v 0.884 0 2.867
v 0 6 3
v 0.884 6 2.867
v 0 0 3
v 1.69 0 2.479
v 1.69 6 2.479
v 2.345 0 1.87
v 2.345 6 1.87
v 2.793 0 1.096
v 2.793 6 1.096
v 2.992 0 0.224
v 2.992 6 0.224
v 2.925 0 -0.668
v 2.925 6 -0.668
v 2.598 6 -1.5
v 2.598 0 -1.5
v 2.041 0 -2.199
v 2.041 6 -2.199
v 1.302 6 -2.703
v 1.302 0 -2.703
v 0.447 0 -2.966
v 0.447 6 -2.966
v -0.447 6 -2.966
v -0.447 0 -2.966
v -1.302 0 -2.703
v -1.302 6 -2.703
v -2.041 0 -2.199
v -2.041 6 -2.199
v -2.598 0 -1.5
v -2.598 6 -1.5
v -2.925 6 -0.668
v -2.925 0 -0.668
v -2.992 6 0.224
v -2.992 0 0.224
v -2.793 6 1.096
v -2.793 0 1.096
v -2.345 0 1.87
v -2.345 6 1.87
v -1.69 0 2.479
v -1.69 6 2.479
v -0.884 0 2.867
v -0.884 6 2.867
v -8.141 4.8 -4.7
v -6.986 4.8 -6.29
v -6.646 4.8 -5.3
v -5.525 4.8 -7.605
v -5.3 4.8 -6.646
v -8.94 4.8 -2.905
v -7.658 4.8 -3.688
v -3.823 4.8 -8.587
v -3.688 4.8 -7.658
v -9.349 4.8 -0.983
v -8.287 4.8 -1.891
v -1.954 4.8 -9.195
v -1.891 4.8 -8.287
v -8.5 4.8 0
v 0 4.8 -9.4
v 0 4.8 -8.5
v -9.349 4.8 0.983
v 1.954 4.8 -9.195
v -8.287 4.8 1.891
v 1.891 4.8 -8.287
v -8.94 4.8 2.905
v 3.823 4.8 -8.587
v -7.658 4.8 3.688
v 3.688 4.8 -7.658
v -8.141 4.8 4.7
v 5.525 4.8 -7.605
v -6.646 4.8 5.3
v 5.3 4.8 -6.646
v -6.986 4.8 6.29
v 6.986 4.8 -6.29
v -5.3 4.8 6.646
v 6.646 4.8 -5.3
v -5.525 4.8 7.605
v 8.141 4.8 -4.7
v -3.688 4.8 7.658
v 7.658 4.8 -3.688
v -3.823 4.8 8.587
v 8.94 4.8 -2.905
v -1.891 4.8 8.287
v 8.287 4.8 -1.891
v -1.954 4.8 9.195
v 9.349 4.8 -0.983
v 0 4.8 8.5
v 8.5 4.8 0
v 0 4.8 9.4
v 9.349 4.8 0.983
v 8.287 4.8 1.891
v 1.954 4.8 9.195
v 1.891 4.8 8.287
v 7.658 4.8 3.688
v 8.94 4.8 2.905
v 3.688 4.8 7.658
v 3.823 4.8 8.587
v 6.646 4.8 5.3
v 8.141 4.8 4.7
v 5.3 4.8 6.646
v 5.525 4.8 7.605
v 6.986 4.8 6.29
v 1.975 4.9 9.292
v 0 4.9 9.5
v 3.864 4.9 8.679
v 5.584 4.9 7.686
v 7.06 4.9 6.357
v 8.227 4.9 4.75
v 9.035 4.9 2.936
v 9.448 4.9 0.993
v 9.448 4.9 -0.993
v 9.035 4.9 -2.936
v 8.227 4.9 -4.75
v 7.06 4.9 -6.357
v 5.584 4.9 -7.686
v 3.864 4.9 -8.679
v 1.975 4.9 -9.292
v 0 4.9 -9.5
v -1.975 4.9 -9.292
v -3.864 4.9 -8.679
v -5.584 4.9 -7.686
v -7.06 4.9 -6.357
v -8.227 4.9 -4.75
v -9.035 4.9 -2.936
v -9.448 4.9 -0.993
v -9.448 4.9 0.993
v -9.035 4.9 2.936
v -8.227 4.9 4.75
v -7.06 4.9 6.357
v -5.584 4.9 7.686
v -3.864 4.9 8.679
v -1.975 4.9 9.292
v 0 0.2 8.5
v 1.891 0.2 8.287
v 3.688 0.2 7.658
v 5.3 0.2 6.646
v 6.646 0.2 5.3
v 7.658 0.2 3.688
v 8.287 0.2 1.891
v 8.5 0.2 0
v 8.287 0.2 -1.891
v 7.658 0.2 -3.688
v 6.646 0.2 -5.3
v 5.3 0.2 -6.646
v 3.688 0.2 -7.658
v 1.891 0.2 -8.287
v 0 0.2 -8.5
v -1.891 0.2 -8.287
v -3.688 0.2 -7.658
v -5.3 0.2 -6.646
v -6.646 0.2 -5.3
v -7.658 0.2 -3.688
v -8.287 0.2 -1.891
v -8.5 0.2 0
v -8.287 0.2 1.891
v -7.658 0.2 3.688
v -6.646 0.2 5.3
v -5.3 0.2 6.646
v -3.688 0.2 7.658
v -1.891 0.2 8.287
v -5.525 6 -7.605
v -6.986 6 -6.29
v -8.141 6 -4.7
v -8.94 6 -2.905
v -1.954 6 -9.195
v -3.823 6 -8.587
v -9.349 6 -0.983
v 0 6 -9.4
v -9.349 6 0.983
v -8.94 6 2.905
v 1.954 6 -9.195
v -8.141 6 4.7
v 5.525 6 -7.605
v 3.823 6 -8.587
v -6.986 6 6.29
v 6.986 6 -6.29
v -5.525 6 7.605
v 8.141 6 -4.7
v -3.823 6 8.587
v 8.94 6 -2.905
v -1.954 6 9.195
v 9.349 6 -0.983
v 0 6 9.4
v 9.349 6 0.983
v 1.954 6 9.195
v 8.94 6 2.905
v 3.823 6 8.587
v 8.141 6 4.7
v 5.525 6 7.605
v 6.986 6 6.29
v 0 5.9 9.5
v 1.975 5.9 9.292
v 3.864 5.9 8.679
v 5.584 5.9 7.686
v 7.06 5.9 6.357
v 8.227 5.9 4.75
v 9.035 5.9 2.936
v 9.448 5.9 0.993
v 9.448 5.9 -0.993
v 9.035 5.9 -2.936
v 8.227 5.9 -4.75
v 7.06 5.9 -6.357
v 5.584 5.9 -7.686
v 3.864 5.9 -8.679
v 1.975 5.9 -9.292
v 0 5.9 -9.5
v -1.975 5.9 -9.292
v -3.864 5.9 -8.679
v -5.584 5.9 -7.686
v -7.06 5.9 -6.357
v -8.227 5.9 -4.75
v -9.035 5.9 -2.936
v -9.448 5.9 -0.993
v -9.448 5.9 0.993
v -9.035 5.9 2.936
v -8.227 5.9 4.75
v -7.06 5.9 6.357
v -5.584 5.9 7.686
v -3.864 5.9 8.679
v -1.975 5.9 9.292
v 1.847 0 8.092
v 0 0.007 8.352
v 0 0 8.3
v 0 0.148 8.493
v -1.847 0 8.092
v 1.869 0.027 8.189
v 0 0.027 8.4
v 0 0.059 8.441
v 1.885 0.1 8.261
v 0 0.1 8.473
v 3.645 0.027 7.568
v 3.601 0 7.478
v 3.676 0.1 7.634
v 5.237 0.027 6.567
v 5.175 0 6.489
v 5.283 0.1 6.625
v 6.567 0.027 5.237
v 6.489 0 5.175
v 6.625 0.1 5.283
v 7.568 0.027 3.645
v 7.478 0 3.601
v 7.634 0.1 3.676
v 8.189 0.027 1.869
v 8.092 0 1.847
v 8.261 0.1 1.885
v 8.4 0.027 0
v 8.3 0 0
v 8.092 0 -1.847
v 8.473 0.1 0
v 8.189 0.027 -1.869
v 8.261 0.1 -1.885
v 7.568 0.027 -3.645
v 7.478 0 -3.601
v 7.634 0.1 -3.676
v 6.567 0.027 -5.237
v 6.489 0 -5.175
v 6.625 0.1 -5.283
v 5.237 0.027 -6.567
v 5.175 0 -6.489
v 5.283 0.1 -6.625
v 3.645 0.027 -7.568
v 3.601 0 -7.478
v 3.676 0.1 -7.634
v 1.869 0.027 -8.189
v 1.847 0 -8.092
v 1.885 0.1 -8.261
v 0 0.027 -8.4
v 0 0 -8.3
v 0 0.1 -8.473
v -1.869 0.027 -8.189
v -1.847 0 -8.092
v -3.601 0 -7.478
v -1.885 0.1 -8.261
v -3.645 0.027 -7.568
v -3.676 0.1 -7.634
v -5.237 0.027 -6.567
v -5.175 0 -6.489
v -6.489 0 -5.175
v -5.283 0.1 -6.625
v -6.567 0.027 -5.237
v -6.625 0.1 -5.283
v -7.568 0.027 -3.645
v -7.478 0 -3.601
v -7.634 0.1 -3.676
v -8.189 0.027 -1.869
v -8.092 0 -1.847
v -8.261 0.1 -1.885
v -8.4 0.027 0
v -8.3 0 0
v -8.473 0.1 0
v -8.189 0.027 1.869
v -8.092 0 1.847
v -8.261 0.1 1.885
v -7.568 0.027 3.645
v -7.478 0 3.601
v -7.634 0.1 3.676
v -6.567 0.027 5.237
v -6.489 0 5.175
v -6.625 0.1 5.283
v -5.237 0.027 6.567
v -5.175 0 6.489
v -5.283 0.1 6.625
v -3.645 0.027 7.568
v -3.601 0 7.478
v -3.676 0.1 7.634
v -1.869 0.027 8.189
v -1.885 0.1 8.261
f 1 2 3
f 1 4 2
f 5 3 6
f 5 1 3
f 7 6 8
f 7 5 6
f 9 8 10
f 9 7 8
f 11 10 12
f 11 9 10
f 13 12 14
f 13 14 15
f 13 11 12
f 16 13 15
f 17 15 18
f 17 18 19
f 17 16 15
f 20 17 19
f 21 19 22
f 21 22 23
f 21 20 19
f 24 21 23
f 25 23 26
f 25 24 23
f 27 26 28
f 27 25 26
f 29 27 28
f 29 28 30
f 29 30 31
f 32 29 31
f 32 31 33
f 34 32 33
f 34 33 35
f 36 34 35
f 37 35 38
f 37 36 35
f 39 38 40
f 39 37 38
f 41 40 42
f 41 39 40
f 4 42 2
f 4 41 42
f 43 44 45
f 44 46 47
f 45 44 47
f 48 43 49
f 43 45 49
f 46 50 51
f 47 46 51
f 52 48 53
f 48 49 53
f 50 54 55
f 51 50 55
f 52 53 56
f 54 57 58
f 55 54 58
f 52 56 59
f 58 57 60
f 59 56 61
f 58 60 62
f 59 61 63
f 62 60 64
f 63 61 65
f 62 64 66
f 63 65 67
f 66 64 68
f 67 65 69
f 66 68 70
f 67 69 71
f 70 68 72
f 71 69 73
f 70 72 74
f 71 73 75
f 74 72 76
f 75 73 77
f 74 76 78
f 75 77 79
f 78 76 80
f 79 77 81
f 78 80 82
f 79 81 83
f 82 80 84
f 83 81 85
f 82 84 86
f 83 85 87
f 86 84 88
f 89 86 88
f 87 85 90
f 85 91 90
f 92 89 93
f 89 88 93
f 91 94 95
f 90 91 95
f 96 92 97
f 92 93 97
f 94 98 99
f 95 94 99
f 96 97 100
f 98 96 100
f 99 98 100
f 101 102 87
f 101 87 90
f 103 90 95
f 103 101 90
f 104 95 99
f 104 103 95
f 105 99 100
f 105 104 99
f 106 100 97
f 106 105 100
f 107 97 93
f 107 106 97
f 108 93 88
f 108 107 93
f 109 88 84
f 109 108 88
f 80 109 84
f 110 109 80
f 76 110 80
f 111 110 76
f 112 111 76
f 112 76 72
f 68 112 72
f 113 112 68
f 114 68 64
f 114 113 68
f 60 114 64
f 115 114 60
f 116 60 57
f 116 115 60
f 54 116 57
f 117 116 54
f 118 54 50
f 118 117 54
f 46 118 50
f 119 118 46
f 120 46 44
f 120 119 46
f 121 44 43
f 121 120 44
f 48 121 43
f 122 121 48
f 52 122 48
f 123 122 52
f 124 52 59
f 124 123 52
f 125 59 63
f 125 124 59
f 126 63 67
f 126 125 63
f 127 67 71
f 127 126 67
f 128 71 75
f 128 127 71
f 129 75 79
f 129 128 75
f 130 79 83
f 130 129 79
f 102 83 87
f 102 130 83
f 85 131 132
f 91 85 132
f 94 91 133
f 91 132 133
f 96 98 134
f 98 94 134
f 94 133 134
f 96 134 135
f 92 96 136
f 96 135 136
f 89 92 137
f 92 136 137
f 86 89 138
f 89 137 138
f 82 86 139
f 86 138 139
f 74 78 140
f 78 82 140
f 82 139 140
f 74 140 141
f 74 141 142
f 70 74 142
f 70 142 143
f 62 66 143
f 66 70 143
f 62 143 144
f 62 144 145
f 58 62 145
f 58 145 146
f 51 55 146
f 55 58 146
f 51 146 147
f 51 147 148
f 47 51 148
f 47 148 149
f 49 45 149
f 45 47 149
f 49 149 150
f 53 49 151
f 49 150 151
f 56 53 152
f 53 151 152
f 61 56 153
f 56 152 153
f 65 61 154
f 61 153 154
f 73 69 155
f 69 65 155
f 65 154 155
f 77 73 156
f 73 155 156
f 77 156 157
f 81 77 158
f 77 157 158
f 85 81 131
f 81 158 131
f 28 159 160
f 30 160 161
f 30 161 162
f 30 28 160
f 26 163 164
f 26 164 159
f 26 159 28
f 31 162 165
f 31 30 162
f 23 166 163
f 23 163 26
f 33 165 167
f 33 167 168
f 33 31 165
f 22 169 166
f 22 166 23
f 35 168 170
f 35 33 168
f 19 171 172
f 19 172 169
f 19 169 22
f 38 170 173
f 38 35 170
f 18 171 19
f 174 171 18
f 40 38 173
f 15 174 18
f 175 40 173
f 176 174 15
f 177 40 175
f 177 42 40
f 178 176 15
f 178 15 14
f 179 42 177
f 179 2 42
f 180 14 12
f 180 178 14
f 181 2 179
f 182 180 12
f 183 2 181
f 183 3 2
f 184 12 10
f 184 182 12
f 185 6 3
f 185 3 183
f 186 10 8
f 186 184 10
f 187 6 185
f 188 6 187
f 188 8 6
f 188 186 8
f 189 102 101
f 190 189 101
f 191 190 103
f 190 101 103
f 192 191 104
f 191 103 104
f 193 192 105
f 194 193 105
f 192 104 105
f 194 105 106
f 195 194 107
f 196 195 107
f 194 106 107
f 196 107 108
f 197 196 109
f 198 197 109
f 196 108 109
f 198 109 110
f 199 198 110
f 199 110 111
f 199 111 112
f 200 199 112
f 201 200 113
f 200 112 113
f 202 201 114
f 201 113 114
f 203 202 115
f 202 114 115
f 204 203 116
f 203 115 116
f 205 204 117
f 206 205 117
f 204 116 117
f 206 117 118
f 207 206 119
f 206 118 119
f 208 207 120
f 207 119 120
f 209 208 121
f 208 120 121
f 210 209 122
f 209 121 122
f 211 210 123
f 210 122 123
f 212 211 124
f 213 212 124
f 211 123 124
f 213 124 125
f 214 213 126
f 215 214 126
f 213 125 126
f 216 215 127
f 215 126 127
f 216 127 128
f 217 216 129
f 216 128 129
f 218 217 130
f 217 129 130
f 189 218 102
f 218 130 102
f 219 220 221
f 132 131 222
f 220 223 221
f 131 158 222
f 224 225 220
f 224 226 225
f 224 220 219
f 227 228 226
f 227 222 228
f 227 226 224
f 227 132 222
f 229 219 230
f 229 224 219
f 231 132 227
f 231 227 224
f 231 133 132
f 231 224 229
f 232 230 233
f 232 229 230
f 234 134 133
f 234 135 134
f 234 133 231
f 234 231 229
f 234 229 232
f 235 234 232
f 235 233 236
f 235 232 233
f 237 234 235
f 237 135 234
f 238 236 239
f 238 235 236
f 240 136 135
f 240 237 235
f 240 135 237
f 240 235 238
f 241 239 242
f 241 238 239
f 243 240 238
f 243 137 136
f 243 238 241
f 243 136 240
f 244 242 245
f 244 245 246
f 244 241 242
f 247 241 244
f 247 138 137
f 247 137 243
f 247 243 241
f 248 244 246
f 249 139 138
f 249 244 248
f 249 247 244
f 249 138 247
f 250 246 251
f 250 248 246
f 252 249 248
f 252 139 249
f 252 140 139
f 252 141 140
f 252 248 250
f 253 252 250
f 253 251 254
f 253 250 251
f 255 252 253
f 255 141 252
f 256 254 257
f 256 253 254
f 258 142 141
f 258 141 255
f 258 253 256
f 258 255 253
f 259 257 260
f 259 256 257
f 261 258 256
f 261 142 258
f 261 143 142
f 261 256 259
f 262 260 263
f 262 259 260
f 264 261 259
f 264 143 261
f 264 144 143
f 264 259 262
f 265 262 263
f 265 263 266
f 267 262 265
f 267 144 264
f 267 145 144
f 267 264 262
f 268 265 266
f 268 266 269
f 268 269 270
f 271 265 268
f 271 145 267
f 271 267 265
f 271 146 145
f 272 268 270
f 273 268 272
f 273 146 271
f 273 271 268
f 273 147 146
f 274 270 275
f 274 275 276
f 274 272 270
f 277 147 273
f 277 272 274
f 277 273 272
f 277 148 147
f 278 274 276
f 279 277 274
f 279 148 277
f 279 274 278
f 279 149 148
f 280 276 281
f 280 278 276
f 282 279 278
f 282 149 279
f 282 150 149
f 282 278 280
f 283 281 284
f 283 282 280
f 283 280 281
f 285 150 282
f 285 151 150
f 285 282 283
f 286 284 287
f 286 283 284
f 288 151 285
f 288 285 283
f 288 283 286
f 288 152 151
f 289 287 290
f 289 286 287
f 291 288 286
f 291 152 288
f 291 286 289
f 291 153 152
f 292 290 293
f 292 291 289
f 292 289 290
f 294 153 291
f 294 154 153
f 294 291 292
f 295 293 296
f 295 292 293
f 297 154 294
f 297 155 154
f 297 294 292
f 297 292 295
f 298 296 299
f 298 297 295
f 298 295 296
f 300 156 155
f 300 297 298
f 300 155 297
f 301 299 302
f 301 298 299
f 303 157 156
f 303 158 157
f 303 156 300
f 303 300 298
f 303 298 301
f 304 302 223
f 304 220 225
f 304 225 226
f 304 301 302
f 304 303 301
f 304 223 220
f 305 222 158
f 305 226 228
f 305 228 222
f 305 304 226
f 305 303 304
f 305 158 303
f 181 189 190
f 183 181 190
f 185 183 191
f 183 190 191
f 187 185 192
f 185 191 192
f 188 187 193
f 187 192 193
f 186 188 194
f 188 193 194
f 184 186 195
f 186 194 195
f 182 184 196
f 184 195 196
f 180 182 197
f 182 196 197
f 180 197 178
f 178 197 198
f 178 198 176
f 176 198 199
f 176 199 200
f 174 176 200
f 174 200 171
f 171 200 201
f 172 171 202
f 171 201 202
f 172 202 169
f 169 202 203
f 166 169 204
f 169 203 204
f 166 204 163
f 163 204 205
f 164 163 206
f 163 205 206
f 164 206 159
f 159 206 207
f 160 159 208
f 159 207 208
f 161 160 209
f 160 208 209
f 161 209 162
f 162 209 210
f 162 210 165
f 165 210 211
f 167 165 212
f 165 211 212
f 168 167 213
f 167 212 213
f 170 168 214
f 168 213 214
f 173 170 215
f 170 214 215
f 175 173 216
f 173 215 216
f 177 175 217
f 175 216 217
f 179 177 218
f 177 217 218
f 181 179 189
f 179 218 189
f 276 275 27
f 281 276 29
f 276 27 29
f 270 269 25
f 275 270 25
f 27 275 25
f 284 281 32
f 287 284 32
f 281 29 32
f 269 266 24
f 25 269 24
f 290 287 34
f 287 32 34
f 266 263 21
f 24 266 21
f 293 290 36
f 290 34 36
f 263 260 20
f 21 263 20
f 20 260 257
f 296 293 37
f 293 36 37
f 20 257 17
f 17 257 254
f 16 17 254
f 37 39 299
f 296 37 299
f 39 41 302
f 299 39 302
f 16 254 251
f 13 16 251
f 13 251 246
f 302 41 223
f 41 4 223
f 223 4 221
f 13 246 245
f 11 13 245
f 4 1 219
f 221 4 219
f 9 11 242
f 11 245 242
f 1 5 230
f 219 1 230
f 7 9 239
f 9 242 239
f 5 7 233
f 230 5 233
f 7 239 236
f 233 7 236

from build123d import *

# Parameters (mm, degrees)
SKETCH_1_R      = 8.5
SKETCH_1_R_2    = 3
EXTRUDE_1_DEPTH = 6
EXTRUDE_START   = -1.2
SKETCH_2_R      = 9.5
SKETCH_2_R_2    = 3
EXTRUDE_2_DEPTH = 1.2
FILLET_1_R      = 0.2
CHAMFER_1_SIZE  = 0.1


with BuildPart() as part:
    # 草图1 → 凸台-拉伸1 (new body)
    with BuildSketch(Plane(origin=(0, 0, 0), x_dir=(1, 0, 0), z_dir=(0, 1, 0))):
        with Locations(Location((0, 0, 0), (0, 0, 270))):
            Circle(SKETCH_1_R)
        with Locations(Location((0, 0, 0), (0, 0, 270))):
            Circle(SKETCH_1_R_2, mode=Mode.SUBTRACT)
    extrude(amount=EXTRUDE_1_DEPTH)

    # 草图2 → 凸台-拉伸2 (add)
    with BuildSketch(Plane(origin=(0, 6, 0), x_dir=(1, 0, 0), z_dir=(0, 1, 0)).offset(EXTRUDE_START)):
        with Locations(Location((0, 0, 0), (0, 0, 270))):
            Circle(SKETCH_2_R)
        with Locations(Location((0, 0, 0), (0, 0, 270))):
            Circle(SKETCH_2_R_2, mode=Mode.SUBTRACT)
    extrude(amount=EXTRUDE_2_DEPTH)

    # 圆角1
    fillet_1_edges = [part.edges().sort_by_distance(p)[0] for p in [
        (0, 0, -8.5),
    ]]
    fillet(fillet_1_edges, radius=FILLET_1_R)

    # 倒角1
    chamfer_1_edges = [part.edges().sort_by_distance(p)[0] for p in [
        (0, 6, -9.5),
        (0, 4.8, -9.5),
    ]]
    chamfer(chamfer_1_edges, length=CHAMFER_1_SIZE)


solid = part.part
